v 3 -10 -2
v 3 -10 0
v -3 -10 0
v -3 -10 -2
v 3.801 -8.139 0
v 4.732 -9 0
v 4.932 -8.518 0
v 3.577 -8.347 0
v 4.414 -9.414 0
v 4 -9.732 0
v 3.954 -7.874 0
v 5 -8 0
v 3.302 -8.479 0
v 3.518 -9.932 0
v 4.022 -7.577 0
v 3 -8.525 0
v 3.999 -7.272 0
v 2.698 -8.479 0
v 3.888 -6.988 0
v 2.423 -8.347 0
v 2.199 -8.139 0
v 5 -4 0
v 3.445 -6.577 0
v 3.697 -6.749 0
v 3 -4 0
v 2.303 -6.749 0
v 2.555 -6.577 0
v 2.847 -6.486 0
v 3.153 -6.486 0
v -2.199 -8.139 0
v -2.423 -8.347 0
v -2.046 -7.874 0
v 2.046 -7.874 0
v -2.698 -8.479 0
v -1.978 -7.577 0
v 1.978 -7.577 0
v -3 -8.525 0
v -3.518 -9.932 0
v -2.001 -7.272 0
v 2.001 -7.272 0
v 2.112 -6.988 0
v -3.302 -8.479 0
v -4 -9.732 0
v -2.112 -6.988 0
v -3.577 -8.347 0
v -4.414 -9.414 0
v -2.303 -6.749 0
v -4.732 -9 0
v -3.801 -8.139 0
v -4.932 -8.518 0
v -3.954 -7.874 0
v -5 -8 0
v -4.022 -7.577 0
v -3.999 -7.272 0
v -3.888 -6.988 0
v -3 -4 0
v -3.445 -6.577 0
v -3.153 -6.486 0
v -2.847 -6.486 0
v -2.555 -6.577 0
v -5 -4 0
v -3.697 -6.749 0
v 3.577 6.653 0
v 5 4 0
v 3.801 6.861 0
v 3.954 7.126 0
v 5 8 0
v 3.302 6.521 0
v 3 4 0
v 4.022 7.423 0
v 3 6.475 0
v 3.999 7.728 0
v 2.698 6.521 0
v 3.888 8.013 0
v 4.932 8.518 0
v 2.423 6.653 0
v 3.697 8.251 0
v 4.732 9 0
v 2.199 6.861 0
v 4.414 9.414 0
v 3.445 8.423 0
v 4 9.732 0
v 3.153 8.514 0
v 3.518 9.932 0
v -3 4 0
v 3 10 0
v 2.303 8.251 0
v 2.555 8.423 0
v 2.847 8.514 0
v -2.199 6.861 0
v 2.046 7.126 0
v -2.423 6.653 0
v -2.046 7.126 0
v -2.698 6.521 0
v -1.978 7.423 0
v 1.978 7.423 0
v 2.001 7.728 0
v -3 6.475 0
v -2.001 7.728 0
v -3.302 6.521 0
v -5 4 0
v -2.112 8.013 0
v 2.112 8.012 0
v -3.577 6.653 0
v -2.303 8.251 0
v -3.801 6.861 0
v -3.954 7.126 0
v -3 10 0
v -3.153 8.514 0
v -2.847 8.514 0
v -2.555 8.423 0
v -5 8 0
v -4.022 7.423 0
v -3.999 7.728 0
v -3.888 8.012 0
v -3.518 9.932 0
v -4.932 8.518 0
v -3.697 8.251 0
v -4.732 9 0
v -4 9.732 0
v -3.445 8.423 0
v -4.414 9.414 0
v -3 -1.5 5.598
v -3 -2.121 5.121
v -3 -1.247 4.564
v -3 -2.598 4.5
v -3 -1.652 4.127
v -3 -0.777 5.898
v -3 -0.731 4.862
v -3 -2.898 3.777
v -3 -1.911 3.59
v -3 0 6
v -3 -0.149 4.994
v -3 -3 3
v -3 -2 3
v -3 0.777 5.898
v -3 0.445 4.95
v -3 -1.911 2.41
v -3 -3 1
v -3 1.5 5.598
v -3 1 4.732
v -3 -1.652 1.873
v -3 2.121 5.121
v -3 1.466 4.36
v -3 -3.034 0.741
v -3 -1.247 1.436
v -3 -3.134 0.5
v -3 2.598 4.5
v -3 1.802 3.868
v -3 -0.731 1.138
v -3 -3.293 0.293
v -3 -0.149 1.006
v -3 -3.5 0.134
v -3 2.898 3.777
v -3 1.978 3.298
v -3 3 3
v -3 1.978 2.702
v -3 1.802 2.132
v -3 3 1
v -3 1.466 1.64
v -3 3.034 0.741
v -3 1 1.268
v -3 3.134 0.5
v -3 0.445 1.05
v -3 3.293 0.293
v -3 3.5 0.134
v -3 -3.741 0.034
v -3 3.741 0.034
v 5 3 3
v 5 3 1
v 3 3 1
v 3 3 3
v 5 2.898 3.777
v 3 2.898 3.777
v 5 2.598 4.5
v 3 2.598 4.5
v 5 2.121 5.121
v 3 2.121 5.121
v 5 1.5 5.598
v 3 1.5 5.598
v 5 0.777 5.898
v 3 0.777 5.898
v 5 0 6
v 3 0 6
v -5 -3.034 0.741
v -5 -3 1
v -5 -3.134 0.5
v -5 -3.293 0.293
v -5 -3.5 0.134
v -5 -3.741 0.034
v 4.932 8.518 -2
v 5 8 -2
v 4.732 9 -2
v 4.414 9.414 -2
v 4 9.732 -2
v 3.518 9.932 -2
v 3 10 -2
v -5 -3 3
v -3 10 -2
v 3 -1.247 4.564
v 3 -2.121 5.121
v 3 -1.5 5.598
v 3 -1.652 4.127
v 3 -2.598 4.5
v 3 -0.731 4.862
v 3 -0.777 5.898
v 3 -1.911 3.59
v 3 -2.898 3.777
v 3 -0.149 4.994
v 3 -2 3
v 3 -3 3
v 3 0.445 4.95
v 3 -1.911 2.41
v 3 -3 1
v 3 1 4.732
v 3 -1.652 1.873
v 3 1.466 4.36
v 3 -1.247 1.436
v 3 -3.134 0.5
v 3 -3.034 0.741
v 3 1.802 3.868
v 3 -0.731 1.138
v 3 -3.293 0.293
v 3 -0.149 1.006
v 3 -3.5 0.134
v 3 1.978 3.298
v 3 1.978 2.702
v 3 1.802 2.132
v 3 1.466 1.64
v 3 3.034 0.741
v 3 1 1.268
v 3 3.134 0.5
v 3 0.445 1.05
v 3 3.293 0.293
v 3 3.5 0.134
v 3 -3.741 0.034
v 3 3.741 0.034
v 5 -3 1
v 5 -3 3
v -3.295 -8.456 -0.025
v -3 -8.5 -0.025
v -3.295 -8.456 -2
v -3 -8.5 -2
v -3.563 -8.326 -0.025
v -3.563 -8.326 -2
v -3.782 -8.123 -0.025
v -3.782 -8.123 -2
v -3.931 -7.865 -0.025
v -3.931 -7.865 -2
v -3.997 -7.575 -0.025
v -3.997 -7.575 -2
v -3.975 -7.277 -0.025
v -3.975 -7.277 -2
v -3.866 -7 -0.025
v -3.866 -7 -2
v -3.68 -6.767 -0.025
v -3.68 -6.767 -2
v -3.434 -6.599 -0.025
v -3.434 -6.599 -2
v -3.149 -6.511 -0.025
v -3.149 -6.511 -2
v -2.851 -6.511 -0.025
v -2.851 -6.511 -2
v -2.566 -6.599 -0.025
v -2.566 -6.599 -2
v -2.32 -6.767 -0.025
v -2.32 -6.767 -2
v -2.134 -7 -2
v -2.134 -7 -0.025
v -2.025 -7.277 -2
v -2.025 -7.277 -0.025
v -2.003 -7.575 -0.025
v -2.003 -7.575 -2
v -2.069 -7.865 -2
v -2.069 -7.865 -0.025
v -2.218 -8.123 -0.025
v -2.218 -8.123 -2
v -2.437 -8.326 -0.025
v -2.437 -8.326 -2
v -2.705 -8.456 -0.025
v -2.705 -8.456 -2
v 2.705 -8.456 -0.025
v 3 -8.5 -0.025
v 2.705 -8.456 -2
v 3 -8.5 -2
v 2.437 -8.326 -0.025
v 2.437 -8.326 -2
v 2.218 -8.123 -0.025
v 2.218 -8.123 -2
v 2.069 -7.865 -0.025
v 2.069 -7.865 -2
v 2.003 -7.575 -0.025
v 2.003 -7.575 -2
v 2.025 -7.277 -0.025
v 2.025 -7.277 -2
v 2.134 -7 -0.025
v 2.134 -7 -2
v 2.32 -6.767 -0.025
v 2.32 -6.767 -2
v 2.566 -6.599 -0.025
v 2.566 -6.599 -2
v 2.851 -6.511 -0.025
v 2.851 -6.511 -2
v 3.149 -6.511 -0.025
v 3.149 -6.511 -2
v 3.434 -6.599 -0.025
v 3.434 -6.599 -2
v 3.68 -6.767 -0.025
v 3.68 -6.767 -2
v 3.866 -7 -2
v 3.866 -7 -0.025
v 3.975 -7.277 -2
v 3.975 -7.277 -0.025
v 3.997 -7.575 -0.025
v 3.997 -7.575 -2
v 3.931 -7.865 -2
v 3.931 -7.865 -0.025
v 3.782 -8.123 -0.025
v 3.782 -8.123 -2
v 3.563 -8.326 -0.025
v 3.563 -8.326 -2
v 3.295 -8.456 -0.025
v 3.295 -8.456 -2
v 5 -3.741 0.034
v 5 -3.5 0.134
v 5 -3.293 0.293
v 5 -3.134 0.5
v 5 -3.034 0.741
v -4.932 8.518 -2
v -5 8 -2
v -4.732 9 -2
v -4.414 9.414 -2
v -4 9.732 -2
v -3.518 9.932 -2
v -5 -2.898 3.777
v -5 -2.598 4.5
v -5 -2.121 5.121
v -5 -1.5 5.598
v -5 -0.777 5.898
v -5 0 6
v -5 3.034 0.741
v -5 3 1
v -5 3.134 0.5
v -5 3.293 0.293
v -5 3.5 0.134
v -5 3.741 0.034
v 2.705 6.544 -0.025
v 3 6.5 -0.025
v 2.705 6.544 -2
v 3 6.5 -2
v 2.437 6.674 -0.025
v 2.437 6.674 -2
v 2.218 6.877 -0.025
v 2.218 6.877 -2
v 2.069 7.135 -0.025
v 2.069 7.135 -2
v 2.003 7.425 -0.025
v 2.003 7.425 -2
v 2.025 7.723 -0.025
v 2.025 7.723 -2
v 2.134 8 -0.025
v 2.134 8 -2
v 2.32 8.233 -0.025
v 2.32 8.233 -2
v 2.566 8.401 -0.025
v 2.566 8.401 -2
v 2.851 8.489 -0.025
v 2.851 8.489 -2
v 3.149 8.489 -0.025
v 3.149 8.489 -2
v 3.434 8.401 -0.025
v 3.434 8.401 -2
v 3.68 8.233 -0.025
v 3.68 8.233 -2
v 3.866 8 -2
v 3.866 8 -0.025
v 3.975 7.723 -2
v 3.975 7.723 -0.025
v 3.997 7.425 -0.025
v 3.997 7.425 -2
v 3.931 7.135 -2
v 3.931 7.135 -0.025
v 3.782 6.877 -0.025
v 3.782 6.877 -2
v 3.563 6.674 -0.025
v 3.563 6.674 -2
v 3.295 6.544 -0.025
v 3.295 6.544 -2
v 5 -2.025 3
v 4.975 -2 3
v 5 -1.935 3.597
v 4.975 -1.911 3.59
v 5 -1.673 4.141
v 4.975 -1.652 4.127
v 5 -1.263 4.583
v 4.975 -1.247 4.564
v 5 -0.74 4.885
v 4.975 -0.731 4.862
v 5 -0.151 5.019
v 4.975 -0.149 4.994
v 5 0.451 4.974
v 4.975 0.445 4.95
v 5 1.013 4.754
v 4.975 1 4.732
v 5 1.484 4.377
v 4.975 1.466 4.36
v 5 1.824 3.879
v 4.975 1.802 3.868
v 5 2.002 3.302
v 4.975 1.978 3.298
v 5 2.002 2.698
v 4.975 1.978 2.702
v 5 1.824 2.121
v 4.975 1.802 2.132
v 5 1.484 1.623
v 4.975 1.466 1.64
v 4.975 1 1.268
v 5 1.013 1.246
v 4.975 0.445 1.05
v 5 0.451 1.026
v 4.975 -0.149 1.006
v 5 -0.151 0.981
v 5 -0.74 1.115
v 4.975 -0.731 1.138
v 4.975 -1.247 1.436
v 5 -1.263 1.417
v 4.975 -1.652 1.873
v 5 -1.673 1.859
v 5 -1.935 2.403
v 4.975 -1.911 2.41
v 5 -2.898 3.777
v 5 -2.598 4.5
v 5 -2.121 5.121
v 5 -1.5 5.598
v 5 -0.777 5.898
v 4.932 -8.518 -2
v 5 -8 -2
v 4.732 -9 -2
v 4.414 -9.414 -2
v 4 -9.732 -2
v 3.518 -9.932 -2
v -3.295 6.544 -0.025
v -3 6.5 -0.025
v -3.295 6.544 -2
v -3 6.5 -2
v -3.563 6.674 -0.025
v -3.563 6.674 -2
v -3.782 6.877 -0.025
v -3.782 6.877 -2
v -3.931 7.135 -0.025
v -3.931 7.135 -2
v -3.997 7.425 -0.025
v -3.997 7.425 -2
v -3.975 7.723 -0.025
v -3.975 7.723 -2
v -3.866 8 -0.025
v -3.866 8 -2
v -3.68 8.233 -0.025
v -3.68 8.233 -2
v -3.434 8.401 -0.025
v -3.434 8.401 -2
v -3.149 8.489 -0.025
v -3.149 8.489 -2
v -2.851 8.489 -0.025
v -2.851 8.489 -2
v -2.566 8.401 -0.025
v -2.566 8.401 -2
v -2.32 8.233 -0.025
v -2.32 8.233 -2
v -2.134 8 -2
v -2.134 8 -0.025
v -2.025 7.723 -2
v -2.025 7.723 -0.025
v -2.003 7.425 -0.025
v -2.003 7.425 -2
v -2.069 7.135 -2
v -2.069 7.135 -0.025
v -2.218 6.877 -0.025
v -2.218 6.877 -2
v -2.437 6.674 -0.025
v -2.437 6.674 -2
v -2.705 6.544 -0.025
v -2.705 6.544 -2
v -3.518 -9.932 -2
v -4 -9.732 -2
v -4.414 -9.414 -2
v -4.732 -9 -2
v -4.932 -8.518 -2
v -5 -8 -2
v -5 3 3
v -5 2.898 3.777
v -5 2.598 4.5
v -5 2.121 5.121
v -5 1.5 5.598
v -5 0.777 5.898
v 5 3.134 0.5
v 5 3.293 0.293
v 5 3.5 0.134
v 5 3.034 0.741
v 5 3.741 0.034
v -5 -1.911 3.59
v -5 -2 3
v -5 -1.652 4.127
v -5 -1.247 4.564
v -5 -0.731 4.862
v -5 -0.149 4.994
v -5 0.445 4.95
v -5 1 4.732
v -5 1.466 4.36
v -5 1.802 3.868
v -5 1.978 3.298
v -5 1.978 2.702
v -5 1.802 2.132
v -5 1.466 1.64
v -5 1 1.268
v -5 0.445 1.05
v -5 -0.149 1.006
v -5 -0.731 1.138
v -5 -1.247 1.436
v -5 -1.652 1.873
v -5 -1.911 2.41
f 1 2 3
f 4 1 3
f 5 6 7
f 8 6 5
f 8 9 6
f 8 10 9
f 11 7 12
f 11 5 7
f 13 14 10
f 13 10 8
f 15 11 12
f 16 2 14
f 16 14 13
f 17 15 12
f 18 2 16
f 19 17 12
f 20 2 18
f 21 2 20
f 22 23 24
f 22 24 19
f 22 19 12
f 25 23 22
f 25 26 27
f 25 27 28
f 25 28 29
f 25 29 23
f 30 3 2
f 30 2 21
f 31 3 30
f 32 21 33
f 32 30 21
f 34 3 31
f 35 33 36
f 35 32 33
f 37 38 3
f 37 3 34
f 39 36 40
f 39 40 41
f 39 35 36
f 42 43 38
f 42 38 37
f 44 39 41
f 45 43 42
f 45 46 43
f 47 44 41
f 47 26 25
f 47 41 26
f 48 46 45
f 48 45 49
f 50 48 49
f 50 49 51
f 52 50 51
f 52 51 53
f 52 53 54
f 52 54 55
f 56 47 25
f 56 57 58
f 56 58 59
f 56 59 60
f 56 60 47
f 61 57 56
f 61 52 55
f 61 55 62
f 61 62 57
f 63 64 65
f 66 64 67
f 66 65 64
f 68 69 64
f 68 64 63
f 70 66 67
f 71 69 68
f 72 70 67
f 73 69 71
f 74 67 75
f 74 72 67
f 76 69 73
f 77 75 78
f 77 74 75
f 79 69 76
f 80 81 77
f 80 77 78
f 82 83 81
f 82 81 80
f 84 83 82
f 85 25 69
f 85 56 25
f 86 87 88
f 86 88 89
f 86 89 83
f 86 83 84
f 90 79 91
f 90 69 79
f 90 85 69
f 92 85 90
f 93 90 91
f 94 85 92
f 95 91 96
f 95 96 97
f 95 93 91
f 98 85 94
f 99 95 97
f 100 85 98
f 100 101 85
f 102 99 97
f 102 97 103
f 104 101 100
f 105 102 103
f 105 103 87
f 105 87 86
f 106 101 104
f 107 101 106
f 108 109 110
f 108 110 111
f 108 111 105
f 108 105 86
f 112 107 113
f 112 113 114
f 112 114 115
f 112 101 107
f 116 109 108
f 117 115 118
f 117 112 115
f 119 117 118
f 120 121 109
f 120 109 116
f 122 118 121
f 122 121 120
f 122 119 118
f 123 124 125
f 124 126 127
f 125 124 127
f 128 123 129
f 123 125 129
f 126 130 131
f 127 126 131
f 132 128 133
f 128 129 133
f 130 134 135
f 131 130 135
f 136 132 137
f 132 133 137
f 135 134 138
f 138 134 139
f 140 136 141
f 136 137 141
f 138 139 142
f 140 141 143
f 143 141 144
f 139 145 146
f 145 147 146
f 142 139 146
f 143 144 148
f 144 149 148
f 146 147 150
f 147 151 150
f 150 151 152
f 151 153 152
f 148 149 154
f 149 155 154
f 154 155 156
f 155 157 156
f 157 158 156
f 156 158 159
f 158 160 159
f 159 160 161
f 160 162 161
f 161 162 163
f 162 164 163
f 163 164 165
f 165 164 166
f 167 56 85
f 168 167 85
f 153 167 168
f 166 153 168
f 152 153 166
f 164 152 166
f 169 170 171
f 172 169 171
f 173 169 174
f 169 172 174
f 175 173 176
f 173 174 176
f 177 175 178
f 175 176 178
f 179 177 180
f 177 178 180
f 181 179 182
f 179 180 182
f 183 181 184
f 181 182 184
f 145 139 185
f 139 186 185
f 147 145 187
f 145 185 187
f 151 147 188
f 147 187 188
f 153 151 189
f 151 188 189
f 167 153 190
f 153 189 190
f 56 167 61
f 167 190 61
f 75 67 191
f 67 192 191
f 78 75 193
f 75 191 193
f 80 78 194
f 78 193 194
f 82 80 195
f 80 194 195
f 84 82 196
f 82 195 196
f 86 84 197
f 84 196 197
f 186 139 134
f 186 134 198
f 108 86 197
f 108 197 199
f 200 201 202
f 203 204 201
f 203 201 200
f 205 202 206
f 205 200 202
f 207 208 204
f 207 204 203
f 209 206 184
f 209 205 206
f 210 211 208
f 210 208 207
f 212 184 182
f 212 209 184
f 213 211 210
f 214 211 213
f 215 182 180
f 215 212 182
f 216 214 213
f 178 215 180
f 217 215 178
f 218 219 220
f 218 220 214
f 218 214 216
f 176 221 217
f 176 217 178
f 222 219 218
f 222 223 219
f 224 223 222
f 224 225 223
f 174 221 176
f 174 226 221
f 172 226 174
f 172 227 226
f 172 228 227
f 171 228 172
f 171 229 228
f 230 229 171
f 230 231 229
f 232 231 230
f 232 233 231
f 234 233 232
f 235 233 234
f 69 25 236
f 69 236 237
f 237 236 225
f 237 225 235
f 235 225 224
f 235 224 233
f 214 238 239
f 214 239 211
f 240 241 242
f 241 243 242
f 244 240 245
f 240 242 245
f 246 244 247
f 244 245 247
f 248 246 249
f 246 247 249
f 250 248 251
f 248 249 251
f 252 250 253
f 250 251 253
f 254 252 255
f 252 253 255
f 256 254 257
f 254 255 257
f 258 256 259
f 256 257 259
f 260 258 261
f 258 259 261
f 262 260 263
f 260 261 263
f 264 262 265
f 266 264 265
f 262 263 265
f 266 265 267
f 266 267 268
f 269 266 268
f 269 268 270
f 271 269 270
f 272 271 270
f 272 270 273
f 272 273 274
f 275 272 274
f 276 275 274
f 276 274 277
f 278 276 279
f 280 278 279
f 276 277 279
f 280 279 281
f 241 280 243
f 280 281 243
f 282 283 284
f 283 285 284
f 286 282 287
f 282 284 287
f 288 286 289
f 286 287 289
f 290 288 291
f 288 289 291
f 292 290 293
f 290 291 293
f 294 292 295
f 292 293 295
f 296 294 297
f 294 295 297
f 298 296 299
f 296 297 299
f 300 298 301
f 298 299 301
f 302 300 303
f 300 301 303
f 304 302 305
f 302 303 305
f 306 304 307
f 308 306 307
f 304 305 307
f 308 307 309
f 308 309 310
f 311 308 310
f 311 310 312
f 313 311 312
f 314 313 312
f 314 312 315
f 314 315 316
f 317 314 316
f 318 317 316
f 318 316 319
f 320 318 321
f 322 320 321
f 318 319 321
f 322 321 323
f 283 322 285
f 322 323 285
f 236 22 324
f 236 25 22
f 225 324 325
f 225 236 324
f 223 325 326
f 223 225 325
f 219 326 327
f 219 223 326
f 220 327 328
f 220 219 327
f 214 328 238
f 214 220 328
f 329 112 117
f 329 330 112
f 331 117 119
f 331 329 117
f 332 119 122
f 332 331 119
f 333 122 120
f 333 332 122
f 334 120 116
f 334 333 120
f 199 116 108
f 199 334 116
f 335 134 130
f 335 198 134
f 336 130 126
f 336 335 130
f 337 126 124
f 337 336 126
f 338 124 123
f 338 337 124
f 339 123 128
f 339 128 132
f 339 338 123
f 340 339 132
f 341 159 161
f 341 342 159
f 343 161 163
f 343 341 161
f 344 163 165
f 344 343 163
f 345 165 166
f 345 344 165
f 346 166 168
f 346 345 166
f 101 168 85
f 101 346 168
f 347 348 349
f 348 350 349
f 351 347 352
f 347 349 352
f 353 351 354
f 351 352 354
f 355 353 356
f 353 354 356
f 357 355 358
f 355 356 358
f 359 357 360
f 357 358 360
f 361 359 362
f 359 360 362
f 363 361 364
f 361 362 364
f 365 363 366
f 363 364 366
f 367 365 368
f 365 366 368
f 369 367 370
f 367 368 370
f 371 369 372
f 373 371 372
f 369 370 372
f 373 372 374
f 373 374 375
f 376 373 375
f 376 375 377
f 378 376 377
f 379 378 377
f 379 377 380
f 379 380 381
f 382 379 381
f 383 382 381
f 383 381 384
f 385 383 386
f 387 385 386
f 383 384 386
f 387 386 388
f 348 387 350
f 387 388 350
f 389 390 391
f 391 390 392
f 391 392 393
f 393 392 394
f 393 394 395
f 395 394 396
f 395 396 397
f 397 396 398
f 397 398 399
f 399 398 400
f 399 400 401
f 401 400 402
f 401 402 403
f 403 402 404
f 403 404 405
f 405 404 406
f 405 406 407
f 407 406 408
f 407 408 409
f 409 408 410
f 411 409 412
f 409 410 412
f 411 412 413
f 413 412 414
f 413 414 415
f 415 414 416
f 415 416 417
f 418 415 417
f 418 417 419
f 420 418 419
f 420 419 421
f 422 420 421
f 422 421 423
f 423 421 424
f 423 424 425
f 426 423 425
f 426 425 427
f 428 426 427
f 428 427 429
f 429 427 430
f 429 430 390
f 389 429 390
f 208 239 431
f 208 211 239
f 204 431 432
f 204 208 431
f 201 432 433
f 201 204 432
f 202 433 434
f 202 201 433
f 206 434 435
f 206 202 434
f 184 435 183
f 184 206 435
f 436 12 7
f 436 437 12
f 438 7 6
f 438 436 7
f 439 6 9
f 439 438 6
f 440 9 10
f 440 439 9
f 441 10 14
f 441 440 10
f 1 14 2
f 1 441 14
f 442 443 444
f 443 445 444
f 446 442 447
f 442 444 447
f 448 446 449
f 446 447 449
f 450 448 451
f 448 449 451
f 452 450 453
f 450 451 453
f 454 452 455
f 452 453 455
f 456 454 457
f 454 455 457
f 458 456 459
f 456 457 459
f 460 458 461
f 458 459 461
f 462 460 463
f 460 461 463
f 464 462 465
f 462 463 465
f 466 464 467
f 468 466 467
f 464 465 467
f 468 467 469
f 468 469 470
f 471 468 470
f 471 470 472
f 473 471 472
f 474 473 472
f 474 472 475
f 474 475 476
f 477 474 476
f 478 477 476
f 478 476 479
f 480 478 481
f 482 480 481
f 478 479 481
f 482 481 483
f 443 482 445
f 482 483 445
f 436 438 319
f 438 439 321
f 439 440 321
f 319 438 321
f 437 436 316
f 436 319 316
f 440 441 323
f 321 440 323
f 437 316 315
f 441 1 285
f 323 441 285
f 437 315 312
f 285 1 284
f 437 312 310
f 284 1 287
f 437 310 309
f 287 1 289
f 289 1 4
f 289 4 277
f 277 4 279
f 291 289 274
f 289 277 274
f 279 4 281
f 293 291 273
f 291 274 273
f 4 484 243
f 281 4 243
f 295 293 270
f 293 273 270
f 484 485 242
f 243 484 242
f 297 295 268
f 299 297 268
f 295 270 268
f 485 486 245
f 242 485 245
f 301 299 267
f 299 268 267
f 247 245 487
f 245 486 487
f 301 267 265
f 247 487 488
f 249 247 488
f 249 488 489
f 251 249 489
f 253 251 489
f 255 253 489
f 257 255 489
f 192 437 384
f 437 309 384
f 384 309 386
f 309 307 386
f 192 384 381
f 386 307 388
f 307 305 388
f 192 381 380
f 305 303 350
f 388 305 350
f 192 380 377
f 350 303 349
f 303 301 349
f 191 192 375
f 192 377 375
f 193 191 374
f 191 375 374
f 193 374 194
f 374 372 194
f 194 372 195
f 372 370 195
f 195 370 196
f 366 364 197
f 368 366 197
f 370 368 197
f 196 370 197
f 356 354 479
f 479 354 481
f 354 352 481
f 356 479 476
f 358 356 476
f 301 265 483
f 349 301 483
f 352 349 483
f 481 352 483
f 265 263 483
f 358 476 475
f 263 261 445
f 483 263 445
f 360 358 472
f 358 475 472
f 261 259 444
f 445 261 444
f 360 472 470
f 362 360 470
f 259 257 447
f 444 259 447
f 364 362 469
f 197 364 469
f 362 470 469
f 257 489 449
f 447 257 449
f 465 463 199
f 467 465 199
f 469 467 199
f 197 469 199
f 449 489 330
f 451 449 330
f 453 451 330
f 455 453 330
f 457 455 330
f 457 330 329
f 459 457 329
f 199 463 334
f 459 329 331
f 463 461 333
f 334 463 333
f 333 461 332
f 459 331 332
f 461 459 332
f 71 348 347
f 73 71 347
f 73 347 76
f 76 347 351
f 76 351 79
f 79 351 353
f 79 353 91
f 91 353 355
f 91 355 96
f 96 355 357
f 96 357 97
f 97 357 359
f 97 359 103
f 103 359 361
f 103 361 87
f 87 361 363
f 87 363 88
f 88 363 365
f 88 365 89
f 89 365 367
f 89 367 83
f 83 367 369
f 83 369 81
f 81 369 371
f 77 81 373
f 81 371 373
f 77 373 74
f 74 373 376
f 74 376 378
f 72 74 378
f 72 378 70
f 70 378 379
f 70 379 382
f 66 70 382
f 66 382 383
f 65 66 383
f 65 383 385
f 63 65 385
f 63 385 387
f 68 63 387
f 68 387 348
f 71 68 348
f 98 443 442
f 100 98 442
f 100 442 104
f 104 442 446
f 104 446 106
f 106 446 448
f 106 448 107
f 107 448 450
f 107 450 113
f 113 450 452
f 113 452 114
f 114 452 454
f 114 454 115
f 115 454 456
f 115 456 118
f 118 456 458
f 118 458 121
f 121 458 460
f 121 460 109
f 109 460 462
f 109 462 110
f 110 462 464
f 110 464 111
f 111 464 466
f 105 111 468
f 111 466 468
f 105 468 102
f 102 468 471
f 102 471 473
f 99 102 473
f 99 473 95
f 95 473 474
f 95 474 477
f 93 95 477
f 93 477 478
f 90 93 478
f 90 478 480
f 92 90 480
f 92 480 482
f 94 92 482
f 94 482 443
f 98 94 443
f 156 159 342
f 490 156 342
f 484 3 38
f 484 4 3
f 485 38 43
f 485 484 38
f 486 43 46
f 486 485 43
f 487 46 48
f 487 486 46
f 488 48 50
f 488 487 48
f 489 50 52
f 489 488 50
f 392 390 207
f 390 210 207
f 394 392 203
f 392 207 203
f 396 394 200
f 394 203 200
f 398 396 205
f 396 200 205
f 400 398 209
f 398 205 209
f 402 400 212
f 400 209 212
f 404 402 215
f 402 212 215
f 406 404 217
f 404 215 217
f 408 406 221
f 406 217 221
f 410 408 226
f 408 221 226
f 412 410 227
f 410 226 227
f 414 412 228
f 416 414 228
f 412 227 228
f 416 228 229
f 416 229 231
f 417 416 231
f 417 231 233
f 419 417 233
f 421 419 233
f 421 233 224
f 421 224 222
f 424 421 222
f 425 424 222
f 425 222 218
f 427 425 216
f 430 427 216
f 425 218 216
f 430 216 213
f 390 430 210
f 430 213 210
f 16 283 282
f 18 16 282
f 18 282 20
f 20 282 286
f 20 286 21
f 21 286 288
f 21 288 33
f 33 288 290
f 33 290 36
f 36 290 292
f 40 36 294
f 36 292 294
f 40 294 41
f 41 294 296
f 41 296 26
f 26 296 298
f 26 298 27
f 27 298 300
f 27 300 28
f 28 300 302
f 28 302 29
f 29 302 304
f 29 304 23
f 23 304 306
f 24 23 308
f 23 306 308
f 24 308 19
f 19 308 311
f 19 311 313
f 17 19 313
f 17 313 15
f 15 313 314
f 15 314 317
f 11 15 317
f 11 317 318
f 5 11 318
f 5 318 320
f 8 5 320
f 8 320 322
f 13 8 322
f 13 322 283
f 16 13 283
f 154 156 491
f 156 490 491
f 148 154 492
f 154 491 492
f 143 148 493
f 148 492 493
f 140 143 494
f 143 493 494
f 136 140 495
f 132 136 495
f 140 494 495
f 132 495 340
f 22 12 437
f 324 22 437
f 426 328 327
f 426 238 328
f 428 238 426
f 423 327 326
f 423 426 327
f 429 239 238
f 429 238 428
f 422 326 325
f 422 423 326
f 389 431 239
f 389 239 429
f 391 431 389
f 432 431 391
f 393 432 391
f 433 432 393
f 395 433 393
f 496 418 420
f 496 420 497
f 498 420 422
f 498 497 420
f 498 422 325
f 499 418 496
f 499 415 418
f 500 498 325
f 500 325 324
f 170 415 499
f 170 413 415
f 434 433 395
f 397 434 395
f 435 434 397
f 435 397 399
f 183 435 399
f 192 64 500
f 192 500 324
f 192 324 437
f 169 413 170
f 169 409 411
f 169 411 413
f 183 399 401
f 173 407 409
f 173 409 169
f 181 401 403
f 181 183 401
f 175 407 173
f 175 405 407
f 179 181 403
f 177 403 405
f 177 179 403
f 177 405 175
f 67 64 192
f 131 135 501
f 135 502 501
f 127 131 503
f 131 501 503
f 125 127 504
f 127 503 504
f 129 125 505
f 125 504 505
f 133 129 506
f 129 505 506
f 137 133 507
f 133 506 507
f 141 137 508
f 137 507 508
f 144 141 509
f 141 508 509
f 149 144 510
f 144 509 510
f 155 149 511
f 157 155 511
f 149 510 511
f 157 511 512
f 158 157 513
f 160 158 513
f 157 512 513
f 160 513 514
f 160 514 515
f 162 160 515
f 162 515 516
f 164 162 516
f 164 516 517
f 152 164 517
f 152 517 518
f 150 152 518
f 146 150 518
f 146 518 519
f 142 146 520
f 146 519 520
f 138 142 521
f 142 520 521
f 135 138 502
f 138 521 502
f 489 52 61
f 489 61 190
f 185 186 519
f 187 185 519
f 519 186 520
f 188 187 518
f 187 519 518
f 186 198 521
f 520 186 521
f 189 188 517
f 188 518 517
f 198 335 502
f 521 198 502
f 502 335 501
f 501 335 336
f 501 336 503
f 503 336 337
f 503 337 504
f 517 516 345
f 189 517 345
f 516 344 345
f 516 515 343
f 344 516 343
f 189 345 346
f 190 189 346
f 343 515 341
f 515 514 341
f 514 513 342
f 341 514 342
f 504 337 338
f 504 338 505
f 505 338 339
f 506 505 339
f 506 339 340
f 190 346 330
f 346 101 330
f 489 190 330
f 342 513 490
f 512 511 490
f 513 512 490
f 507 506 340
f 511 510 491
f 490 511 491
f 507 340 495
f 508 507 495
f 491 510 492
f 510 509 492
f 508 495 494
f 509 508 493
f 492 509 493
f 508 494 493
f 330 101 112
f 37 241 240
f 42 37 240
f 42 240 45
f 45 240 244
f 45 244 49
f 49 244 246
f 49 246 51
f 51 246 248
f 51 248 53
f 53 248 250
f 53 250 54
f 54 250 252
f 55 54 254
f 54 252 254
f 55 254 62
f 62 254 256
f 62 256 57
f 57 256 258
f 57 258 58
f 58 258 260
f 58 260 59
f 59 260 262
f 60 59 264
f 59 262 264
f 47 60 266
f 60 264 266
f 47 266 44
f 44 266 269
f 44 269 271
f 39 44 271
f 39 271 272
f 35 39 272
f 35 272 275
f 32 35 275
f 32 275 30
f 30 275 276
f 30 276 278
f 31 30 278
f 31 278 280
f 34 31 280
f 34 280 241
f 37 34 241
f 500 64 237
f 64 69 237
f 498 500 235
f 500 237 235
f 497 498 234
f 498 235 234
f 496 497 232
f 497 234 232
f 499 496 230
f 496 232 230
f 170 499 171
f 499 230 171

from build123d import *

# Parameters (mm, degrees)
SKETCH1_W                       = 20
SKETCH1_H                       = 10
BOSS_EXTRUDE1_DEPTH             = 2
SKETCH2_W                       = 6
SKETCH2_H                       = 2
BOSS_EXTRUDE2_DEPTH             = 6
FILLET1_R                       = 3
F_4_0MM_DOWEL_HOLE1_D           = 4
F_4_0MM_DOWEL_HOLE1_CSINK_D     = 4.05
F_4_0MM_DOWEL_HOLE1_CSINK_ANGLE = 90
F_2_0MM_DOWEL_HOLE1_D           = 2
F_2_0MM_DOWEL_HOLE1_CSINK_D     = 2.05
F_2_0MM_DOWEL_HOLE1_CSINK_ANGLE = 90
FILLET2_R                       = 1
FILLET3_R                       = 2


with BuildPart() as part:
    # Sketch1 → Boss-Extrude1 (new body)
    with BuildSketch(Plane(origin=(0, 0, 0), x_dir=(0, 1, 0), z_dir=(0, 0, 1))):
        Rectangle(SKETCH1_W, SKETCH1_H)
    extrude(amount=-BOSS_EXTRUDE1_DEPTH)

    # Sketch2 → Boss-Extrude2 (add)
    with BuildSketch(Plane(origin=(0, 0, 0), x_dir=(0, 1, 0), z_dir=(0, 0, 1))):
        with Locations((0, 4)):
            Rectangle(SKETCH2_W, SKETCH2_H)
        with Locations((0, -4)):
            Rectangle(SKETCH2_W, SKETCH2_H)
    extrude(amount=BOSS_EXTRUDE2_DEPTH)

    # Fillet1
    fillet1_edges = [part.edges().sort_by_distance(p)[0] for p in [
        (4, 3, 6),
        (4, -3, 6),
        (-4, 3, 6),
        (-4, -3, 6),
    ]]
    fillet(fillet1_edges, radius=FILLET1_R - 0.0001)  # a hair under: the kernel refuses the full size

    # Ø4.0mm Dowel Hole1 (through all)
    with Locations(Plane.YZ.offset(5)):
        with Locations((0, 3)):
            CounterSinkHole(F_4_0MM_DOWEL_HOLE1_D / 2, F_4_0MM_DOWEL_HOLE1_CSINK_D / 2, counter_sink_angle=F_4_0MM_DOWEL_HOLE1_CSINK_ANGLE)

    # Ø2.0mm Dowel Hole1 (through all)
    with Locations(Plane(origin=(0, 0, 0), x_dir=(0, 1, 0), z_dir=(0, 0, 1))):
        with Locations((7.5, -3), (-7.5, 3), (-7.5, -3), (7.5, 3)):
            CounterSinkHole(F_2_0MM_DOWEL_HOLE1_D / 2, F_2_0MM_DOWEL_HOLE1_CSINK_D / 2, counter_sink_angle=F_2_0MM_DOWEL_HOLE1_CSINK_ANGLE)

    # Fillet2
    fillet2_edges = [part.edges().sort_by_distance(p)[0] for p in [
        (-4, -3, 0),
        (-4, 3, 0),
        (4, -3, 0),
        (4, 3, 0),
    ]]
    fillet(fillet2_edges, radius=FILLET2_R)

    # Fillet3
    fillet3_edges = [part.edges().sort_by_distance(p)[0] for p in [
        (-5, -10, -1),
        (-5, 10, -1),
        (5, 10, -1),
        (5, -10, -1),
    ]]
    fillet(fillet3_edges, radius=FILLET3_R)


solid = part.part
